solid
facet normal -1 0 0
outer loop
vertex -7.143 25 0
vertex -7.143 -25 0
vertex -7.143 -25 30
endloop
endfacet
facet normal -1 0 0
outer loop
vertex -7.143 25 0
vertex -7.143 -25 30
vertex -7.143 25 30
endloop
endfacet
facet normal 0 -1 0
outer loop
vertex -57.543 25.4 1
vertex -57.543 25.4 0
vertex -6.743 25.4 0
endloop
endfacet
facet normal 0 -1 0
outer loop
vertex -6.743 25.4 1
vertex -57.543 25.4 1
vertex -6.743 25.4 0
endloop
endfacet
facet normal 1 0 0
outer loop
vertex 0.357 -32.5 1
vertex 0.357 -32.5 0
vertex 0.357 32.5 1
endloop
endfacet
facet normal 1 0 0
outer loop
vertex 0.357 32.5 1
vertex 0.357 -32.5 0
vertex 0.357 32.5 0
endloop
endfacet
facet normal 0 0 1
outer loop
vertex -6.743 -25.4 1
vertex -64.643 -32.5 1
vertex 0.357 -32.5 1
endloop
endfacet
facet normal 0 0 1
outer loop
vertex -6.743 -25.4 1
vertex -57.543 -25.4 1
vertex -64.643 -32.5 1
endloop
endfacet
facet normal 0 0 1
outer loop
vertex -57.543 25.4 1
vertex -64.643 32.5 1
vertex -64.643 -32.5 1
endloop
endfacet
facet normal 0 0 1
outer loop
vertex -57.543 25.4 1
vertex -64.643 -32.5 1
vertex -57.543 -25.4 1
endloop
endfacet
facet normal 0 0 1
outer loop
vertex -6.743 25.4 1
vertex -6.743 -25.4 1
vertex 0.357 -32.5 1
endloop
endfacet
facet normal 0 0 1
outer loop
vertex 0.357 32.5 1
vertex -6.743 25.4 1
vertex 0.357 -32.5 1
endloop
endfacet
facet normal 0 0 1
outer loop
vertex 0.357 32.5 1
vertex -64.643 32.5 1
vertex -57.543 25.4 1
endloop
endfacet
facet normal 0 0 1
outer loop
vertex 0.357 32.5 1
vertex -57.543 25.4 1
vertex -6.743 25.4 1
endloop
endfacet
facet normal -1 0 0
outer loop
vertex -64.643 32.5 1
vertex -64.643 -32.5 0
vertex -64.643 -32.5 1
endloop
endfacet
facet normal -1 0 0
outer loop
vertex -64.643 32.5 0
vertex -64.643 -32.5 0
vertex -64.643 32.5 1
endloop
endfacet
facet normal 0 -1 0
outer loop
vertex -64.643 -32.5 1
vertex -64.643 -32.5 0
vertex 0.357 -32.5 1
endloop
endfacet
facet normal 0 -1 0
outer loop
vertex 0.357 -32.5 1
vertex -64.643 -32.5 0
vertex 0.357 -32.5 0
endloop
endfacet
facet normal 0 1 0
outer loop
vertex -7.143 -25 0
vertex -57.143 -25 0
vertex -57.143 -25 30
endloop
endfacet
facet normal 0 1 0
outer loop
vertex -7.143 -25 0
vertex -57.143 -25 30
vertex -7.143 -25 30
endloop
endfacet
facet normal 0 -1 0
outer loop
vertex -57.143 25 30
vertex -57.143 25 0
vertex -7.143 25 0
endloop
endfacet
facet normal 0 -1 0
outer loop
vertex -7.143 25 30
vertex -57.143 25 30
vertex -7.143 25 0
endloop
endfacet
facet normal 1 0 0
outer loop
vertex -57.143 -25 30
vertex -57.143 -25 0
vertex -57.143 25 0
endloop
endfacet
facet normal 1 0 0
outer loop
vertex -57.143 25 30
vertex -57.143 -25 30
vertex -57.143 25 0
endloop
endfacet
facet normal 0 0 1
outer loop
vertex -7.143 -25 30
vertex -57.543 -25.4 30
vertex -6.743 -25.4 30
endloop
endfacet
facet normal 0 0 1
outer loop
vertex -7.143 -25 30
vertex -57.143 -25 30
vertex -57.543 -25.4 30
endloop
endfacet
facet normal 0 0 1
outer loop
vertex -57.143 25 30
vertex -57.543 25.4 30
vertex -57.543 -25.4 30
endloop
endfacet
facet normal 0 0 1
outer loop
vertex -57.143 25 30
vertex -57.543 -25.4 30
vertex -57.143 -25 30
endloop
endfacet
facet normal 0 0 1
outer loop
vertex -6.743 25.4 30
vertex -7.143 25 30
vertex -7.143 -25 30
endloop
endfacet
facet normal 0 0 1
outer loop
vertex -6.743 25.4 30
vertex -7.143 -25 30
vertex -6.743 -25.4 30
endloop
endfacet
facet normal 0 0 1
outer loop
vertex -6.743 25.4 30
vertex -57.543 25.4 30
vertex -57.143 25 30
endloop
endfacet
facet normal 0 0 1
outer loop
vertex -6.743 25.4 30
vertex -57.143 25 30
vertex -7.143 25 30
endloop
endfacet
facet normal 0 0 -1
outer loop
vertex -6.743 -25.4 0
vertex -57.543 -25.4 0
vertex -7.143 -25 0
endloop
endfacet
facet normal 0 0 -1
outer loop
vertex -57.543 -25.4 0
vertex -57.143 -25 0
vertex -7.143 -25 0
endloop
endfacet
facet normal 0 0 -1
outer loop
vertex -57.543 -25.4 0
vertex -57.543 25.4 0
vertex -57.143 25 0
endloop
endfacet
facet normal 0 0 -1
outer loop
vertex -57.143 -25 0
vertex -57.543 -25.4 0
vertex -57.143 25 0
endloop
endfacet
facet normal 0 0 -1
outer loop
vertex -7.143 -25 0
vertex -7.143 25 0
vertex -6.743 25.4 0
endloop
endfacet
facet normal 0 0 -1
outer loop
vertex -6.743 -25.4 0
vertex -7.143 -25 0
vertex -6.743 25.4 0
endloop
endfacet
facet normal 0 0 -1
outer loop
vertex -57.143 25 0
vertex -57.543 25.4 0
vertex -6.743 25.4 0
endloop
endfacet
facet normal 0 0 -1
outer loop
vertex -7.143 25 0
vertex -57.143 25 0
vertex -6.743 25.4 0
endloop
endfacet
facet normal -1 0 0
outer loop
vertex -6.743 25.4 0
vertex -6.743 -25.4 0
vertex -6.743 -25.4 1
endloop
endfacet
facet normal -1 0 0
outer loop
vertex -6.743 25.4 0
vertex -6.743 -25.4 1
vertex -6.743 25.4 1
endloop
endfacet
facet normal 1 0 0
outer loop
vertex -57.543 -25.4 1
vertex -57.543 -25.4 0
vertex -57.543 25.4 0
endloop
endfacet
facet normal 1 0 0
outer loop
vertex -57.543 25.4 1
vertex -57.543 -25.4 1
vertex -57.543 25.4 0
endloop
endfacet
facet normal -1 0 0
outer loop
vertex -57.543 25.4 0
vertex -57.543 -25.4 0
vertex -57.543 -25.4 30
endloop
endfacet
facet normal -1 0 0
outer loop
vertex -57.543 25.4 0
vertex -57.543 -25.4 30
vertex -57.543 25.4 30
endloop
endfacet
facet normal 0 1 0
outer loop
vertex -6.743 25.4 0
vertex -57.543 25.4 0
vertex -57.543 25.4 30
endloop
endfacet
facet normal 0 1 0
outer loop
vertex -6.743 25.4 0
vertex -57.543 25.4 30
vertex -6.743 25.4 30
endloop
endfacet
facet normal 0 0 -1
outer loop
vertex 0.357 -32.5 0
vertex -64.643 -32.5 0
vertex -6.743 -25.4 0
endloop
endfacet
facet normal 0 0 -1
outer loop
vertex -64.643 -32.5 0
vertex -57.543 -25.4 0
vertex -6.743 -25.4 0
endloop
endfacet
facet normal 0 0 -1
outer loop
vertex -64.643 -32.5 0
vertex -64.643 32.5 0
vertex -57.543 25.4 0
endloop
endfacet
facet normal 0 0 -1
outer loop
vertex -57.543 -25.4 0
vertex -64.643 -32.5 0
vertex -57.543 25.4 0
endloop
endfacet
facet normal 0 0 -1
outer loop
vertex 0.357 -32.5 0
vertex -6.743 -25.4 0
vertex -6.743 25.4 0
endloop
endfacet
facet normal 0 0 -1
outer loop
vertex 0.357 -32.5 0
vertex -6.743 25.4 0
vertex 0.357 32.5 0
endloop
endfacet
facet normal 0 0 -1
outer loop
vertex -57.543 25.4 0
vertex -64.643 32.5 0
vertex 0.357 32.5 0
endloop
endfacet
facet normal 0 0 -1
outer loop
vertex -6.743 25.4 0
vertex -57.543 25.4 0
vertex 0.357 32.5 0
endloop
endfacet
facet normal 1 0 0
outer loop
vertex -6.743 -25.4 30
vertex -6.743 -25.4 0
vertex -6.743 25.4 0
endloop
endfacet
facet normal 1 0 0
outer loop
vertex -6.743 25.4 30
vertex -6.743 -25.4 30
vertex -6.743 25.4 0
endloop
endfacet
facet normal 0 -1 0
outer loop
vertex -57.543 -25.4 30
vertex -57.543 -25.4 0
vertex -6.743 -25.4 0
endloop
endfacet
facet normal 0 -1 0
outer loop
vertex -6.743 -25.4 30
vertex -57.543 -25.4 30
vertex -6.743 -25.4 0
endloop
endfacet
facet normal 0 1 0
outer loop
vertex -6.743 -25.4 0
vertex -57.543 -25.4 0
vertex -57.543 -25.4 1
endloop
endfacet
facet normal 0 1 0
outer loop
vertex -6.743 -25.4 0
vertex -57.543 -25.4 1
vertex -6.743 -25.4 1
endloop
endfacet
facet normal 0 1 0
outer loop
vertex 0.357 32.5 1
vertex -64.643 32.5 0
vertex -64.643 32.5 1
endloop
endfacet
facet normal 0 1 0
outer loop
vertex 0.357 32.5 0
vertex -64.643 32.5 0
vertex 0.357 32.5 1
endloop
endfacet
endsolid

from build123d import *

# Parameters (mm, degrees)
F0_W     = 50.8
F0_H     = 50.8
F0_W_2   = 50
F0_H_2   = 50
F1_DEPTH = 30
F0_W_3   = 65
F0_H_3   = 65
F2_DEPTH = 1


with BuildPart() as f1:
    # F0 (on Top) → F1 (new body)
    with BuildSketch(Plane.XY):
        with Locations((-32.142855, 0)):
            Rectangle(F0_W, F0_H)
        with Locations((-32.142855, 0)):
            Rectangle(F0_W_2, F0_H_2, mode=Mode.SUBTRACT)
    extrude(amount=F1_DEPTH)


with BuildPart() as f2:
    # F0 (on Top) → F2 (new body)
    with BuildSketch(Plane.XY):
        with Locations((-32.142855, 0)):
            Rectangle(F0_W_3, F0_H_3)
        with Locations((-32.142855, 0)):
            Rectangle(F0_W, F0_H, mode=Mode.SUBTRACT)
    extrude(amount=F2_DEPTH)


solid = Compound([f1.part, f2.part])
